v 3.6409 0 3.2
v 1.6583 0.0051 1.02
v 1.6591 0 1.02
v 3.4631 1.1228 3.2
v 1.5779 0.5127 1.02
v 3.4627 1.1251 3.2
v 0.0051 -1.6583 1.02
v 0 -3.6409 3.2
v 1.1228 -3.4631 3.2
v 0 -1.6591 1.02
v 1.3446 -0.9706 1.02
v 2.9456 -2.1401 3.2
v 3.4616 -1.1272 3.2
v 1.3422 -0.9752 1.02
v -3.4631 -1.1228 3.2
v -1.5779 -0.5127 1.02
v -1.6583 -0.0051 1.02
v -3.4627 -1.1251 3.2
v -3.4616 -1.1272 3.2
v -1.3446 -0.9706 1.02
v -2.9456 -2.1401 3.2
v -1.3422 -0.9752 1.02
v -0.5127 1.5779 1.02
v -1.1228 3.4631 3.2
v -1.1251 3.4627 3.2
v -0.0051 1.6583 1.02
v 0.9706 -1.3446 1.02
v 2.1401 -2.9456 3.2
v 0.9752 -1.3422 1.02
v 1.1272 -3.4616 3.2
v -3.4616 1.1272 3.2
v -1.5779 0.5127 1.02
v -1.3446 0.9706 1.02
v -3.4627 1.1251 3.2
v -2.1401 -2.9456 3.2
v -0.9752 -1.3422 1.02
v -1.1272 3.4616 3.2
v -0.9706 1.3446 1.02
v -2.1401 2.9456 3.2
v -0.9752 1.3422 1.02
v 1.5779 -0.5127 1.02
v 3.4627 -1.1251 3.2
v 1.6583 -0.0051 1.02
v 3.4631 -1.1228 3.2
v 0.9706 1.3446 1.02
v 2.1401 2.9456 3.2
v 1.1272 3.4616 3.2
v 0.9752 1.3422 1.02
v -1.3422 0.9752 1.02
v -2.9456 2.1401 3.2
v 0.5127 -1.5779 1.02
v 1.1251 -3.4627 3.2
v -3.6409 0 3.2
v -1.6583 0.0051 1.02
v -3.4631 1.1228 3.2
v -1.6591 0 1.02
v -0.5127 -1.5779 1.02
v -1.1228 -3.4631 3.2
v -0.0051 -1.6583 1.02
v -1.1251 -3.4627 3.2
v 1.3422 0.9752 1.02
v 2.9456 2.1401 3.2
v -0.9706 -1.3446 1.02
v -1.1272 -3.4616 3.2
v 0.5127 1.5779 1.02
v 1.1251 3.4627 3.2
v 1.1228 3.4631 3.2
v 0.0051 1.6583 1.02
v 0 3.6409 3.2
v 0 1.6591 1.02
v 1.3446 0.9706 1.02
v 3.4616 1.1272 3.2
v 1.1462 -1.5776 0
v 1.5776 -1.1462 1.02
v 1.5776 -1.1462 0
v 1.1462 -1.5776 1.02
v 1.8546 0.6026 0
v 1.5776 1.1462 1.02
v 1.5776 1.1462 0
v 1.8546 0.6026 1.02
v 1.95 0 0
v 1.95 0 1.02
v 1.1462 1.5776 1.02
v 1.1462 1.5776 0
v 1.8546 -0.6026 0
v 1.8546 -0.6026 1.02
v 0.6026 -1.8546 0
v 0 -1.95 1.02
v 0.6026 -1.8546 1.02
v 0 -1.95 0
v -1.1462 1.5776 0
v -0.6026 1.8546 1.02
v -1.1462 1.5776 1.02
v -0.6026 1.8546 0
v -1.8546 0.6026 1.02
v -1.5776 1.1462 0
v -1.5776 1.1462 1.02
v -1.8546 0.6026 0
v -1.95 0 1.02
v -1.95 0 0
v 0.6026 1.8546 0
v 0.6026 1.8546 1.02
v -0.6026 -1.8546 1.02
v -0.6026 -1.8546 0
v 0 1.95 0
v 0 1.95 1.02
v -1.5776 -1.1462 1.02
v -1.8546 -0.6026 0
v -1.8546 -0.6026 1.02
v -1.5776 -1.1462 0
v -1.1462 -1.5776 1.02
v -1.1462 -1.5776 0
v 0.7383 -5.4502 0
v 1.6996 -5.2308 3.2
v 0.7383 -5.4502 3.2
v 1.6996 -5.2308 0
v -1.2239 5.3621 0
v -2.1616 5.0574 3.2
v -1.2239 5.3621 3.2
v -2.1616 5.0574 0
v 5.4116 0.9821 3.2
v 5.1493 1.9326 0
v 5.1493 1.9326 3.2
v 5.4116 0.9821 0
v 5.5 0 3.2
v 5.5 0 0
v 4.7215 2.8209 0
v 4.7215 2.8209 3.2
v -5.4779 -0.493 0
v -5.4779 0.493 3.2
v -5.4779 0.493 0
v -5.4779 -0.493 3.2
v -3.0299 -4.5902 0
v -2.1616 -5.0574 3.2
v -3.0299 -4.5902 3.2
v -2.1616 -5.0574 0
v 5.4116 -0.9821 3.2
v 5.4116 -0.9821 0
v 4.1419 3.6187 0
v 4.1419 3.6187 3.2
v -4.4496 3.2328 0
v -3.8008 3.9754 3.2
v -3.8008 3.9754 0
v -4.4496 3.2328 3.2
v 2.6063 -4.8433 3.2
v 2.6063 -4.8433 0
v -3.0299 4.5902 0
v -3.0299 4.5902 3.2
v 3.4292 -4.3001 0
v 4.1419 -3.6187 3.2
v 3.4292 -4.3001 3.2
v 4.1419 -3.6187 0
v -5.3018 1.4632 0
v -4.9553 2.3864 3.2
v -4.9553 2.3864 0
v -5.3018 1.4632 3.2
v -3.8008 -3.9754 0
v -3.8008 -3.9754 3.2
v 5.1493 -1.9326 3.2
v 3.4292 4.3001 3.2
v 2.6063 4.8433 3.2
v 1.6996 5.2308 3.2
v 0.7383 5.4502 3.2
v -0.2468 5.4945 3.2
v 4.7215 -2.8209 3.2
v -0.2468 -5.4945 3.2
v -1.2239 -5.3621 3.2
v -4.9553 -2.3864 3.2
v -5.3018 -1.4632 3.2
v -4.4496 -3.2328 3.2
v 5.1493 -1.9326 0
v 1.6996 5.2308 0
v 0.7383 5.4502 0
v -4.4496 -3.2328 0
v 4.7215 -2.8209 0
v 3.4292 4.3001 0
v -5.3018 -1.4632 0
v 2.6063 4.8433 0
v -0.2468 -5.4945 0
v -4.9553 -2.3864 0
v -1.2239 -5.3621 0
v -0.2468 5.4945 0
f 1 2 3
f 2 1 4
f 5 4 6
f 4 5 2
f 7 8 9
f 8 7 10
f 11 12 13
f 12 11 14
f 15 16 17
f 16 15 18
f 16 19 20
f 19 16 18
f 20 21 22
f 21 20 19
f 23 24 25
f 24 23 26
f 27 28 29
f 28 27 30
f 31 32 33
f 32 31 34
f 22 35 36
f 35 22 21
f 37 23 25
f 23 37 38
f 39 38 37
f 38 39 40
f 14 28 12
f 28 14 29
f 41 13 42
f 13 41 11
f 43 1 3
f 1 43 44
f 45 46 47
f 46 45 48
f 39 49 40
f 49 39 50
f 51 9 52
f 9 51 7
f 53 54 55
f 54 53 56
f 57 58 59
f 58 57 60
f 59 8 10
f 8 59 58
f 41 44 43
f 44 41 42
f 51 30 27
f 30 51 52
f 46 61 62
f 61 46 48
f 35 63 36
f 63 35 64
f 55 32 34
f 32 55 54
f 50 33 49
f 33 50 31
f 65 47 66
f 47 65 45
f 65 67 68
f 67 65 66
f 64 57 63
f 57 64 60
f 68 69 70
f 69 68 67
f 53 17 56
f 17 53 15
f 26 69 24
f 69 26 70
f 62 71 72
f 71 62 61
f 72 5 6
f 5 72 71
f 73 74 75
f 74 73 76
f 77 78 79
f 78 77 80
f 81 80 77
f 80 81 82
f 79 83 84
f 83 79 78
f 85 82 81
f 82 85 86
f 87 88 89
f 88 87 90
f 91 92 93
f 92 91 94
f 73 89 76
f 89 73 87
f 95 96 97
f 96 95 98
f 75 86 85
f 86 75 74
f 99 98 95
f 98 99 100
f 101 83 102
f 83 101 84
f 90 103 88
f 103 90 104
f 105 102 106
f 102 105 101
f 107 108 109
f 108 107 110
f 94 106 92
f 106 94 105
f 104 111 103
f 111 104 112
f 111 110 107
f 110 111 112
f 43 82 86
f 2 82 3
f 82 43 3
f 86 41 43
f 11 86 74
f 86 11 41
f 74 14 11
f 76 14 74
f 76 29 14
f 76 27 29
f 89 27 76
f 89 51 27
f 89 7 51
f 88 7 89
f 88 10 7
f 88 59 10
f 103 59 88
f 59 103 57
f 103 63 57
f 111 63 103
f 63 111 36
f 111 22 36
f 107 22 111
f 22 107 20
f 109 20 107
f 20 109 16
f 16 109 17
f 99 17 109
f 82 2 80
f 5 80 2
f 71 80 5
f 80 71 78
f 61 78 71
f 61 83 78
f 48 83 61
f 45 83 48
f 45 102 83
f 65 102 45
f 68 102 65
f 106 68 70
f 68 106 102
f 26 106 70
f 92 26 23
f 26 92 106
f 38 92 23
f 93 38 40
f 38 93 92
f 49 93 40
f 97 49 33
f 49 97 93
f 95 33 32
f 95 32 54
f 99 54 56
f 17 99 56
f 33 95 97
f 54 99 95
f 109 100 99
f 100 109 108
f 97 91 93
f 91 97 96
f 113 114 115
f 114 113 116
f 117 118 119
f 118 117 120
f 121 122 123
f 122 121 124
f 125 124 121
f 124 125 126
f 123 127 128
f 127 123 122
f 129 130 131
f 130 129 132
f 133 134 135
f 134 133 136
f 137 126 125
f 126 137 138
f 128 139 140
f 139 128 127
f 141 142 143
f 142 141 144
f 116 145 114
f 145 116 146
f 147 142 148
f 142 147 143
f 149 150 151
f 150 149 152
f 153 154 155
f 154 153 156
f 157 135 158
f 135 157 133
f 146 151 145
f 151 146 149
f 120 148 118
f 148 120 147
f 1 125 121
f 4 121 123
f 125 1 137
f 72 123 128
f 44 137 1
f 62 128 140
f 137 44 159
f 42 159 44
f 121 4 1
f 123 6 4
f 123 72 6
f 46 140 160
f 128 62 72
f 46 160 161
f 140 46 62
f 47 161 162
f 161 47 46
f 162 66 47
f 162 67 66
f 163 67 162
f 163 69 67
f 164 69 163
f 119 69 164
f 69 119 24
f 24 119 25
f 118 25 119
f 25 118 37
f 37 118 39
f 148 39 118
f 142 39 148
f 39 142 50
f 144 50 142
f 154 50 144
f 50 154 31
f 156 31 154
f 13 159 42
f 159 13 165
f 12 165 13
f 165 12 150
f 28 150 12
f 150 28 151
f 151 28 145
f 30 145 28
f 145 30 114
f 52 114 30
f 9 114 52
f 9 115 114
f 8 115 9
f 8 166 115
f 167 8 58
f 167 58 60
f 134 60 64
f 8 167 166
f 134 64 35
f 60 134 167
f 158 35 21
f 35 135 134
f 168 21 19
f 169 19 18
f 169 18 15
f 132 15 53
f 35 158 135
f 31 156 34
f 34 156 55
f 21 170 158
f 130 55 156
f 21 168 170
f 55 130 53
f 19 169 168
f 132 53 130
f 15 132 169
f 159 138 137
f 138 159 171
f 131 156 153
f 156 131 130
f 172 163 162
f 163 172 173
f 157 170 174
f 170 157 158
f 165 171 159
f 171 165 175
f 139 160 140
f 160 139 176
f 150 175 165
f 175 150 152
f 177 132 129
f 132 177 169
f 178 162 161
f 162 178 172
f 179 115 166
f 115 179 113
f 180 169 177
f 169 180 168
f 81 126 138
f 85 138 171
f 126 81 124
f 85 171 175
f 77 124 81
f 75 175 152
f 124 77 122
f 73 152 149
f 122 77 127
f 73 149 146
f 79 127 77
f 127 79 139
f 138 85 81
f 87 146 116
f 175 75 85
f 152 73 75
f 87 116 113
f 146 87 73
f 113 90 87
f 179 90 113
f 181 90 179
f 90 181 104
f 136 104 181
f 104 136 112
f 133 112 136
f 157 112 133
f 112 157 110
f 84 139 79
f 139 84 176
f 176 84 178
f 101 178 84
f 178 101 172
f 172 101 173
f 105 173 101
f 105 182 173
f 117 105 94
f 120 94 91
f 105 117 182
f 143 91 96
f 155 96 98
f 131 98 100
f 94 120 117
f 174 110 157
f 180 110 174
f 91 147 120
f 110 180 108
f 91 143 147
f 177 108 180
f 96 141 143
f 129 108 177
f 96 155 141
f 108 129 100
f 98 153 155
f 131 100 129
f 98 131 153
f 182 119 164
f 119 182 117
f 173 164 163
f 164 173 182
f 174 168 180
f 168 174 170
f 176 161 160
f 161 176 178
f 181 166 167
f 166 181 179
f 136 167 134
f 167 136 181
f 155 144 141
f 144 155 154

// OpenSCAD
// Washers
// 7-12-2024 Geprint voor montage NVR

// Some material definitions
// defaults in prusa slicer 0.15 height (0.2 first layer)
layer_1=0.2;
layer_n=0.15;
base_h=layer_1+layer_n*20; // 3.2mm

$fa=1; // min facet angle
$fs=1; // min facet size

module washer() {
    difference() {
        cylinder(h=base_h,d=11);
        screw_countersunk();
    }
}
*washer();

// model countersunk screw for 3d printing
// useful for creating attachement bores
// which fit these screws
// default values are for 3mm x 20mm screw with 6mm head (3.2mm bore for tolerance)
module screw_countersunk(
        z  = base_h, //displacement z
        l  = 22,     //length
        dh =  7.3,   //head dia
        db =  3.3,   //base dia (smaller icw ds)
        lh =  2.2,   //head length
        ds =  3.9,   //shaft dia
        )
{
    translate([0,0,z-lh+0.01])
        cylinder(h=lh, r1=db/2, r2=dh/2, $fn=20);
    translate([0,0,z-lh+0.02-l])
        cylinder(h=l, d=ds, $fn=20);
}
*screw_countersunk();

translate([0,0,0]) washer();    
